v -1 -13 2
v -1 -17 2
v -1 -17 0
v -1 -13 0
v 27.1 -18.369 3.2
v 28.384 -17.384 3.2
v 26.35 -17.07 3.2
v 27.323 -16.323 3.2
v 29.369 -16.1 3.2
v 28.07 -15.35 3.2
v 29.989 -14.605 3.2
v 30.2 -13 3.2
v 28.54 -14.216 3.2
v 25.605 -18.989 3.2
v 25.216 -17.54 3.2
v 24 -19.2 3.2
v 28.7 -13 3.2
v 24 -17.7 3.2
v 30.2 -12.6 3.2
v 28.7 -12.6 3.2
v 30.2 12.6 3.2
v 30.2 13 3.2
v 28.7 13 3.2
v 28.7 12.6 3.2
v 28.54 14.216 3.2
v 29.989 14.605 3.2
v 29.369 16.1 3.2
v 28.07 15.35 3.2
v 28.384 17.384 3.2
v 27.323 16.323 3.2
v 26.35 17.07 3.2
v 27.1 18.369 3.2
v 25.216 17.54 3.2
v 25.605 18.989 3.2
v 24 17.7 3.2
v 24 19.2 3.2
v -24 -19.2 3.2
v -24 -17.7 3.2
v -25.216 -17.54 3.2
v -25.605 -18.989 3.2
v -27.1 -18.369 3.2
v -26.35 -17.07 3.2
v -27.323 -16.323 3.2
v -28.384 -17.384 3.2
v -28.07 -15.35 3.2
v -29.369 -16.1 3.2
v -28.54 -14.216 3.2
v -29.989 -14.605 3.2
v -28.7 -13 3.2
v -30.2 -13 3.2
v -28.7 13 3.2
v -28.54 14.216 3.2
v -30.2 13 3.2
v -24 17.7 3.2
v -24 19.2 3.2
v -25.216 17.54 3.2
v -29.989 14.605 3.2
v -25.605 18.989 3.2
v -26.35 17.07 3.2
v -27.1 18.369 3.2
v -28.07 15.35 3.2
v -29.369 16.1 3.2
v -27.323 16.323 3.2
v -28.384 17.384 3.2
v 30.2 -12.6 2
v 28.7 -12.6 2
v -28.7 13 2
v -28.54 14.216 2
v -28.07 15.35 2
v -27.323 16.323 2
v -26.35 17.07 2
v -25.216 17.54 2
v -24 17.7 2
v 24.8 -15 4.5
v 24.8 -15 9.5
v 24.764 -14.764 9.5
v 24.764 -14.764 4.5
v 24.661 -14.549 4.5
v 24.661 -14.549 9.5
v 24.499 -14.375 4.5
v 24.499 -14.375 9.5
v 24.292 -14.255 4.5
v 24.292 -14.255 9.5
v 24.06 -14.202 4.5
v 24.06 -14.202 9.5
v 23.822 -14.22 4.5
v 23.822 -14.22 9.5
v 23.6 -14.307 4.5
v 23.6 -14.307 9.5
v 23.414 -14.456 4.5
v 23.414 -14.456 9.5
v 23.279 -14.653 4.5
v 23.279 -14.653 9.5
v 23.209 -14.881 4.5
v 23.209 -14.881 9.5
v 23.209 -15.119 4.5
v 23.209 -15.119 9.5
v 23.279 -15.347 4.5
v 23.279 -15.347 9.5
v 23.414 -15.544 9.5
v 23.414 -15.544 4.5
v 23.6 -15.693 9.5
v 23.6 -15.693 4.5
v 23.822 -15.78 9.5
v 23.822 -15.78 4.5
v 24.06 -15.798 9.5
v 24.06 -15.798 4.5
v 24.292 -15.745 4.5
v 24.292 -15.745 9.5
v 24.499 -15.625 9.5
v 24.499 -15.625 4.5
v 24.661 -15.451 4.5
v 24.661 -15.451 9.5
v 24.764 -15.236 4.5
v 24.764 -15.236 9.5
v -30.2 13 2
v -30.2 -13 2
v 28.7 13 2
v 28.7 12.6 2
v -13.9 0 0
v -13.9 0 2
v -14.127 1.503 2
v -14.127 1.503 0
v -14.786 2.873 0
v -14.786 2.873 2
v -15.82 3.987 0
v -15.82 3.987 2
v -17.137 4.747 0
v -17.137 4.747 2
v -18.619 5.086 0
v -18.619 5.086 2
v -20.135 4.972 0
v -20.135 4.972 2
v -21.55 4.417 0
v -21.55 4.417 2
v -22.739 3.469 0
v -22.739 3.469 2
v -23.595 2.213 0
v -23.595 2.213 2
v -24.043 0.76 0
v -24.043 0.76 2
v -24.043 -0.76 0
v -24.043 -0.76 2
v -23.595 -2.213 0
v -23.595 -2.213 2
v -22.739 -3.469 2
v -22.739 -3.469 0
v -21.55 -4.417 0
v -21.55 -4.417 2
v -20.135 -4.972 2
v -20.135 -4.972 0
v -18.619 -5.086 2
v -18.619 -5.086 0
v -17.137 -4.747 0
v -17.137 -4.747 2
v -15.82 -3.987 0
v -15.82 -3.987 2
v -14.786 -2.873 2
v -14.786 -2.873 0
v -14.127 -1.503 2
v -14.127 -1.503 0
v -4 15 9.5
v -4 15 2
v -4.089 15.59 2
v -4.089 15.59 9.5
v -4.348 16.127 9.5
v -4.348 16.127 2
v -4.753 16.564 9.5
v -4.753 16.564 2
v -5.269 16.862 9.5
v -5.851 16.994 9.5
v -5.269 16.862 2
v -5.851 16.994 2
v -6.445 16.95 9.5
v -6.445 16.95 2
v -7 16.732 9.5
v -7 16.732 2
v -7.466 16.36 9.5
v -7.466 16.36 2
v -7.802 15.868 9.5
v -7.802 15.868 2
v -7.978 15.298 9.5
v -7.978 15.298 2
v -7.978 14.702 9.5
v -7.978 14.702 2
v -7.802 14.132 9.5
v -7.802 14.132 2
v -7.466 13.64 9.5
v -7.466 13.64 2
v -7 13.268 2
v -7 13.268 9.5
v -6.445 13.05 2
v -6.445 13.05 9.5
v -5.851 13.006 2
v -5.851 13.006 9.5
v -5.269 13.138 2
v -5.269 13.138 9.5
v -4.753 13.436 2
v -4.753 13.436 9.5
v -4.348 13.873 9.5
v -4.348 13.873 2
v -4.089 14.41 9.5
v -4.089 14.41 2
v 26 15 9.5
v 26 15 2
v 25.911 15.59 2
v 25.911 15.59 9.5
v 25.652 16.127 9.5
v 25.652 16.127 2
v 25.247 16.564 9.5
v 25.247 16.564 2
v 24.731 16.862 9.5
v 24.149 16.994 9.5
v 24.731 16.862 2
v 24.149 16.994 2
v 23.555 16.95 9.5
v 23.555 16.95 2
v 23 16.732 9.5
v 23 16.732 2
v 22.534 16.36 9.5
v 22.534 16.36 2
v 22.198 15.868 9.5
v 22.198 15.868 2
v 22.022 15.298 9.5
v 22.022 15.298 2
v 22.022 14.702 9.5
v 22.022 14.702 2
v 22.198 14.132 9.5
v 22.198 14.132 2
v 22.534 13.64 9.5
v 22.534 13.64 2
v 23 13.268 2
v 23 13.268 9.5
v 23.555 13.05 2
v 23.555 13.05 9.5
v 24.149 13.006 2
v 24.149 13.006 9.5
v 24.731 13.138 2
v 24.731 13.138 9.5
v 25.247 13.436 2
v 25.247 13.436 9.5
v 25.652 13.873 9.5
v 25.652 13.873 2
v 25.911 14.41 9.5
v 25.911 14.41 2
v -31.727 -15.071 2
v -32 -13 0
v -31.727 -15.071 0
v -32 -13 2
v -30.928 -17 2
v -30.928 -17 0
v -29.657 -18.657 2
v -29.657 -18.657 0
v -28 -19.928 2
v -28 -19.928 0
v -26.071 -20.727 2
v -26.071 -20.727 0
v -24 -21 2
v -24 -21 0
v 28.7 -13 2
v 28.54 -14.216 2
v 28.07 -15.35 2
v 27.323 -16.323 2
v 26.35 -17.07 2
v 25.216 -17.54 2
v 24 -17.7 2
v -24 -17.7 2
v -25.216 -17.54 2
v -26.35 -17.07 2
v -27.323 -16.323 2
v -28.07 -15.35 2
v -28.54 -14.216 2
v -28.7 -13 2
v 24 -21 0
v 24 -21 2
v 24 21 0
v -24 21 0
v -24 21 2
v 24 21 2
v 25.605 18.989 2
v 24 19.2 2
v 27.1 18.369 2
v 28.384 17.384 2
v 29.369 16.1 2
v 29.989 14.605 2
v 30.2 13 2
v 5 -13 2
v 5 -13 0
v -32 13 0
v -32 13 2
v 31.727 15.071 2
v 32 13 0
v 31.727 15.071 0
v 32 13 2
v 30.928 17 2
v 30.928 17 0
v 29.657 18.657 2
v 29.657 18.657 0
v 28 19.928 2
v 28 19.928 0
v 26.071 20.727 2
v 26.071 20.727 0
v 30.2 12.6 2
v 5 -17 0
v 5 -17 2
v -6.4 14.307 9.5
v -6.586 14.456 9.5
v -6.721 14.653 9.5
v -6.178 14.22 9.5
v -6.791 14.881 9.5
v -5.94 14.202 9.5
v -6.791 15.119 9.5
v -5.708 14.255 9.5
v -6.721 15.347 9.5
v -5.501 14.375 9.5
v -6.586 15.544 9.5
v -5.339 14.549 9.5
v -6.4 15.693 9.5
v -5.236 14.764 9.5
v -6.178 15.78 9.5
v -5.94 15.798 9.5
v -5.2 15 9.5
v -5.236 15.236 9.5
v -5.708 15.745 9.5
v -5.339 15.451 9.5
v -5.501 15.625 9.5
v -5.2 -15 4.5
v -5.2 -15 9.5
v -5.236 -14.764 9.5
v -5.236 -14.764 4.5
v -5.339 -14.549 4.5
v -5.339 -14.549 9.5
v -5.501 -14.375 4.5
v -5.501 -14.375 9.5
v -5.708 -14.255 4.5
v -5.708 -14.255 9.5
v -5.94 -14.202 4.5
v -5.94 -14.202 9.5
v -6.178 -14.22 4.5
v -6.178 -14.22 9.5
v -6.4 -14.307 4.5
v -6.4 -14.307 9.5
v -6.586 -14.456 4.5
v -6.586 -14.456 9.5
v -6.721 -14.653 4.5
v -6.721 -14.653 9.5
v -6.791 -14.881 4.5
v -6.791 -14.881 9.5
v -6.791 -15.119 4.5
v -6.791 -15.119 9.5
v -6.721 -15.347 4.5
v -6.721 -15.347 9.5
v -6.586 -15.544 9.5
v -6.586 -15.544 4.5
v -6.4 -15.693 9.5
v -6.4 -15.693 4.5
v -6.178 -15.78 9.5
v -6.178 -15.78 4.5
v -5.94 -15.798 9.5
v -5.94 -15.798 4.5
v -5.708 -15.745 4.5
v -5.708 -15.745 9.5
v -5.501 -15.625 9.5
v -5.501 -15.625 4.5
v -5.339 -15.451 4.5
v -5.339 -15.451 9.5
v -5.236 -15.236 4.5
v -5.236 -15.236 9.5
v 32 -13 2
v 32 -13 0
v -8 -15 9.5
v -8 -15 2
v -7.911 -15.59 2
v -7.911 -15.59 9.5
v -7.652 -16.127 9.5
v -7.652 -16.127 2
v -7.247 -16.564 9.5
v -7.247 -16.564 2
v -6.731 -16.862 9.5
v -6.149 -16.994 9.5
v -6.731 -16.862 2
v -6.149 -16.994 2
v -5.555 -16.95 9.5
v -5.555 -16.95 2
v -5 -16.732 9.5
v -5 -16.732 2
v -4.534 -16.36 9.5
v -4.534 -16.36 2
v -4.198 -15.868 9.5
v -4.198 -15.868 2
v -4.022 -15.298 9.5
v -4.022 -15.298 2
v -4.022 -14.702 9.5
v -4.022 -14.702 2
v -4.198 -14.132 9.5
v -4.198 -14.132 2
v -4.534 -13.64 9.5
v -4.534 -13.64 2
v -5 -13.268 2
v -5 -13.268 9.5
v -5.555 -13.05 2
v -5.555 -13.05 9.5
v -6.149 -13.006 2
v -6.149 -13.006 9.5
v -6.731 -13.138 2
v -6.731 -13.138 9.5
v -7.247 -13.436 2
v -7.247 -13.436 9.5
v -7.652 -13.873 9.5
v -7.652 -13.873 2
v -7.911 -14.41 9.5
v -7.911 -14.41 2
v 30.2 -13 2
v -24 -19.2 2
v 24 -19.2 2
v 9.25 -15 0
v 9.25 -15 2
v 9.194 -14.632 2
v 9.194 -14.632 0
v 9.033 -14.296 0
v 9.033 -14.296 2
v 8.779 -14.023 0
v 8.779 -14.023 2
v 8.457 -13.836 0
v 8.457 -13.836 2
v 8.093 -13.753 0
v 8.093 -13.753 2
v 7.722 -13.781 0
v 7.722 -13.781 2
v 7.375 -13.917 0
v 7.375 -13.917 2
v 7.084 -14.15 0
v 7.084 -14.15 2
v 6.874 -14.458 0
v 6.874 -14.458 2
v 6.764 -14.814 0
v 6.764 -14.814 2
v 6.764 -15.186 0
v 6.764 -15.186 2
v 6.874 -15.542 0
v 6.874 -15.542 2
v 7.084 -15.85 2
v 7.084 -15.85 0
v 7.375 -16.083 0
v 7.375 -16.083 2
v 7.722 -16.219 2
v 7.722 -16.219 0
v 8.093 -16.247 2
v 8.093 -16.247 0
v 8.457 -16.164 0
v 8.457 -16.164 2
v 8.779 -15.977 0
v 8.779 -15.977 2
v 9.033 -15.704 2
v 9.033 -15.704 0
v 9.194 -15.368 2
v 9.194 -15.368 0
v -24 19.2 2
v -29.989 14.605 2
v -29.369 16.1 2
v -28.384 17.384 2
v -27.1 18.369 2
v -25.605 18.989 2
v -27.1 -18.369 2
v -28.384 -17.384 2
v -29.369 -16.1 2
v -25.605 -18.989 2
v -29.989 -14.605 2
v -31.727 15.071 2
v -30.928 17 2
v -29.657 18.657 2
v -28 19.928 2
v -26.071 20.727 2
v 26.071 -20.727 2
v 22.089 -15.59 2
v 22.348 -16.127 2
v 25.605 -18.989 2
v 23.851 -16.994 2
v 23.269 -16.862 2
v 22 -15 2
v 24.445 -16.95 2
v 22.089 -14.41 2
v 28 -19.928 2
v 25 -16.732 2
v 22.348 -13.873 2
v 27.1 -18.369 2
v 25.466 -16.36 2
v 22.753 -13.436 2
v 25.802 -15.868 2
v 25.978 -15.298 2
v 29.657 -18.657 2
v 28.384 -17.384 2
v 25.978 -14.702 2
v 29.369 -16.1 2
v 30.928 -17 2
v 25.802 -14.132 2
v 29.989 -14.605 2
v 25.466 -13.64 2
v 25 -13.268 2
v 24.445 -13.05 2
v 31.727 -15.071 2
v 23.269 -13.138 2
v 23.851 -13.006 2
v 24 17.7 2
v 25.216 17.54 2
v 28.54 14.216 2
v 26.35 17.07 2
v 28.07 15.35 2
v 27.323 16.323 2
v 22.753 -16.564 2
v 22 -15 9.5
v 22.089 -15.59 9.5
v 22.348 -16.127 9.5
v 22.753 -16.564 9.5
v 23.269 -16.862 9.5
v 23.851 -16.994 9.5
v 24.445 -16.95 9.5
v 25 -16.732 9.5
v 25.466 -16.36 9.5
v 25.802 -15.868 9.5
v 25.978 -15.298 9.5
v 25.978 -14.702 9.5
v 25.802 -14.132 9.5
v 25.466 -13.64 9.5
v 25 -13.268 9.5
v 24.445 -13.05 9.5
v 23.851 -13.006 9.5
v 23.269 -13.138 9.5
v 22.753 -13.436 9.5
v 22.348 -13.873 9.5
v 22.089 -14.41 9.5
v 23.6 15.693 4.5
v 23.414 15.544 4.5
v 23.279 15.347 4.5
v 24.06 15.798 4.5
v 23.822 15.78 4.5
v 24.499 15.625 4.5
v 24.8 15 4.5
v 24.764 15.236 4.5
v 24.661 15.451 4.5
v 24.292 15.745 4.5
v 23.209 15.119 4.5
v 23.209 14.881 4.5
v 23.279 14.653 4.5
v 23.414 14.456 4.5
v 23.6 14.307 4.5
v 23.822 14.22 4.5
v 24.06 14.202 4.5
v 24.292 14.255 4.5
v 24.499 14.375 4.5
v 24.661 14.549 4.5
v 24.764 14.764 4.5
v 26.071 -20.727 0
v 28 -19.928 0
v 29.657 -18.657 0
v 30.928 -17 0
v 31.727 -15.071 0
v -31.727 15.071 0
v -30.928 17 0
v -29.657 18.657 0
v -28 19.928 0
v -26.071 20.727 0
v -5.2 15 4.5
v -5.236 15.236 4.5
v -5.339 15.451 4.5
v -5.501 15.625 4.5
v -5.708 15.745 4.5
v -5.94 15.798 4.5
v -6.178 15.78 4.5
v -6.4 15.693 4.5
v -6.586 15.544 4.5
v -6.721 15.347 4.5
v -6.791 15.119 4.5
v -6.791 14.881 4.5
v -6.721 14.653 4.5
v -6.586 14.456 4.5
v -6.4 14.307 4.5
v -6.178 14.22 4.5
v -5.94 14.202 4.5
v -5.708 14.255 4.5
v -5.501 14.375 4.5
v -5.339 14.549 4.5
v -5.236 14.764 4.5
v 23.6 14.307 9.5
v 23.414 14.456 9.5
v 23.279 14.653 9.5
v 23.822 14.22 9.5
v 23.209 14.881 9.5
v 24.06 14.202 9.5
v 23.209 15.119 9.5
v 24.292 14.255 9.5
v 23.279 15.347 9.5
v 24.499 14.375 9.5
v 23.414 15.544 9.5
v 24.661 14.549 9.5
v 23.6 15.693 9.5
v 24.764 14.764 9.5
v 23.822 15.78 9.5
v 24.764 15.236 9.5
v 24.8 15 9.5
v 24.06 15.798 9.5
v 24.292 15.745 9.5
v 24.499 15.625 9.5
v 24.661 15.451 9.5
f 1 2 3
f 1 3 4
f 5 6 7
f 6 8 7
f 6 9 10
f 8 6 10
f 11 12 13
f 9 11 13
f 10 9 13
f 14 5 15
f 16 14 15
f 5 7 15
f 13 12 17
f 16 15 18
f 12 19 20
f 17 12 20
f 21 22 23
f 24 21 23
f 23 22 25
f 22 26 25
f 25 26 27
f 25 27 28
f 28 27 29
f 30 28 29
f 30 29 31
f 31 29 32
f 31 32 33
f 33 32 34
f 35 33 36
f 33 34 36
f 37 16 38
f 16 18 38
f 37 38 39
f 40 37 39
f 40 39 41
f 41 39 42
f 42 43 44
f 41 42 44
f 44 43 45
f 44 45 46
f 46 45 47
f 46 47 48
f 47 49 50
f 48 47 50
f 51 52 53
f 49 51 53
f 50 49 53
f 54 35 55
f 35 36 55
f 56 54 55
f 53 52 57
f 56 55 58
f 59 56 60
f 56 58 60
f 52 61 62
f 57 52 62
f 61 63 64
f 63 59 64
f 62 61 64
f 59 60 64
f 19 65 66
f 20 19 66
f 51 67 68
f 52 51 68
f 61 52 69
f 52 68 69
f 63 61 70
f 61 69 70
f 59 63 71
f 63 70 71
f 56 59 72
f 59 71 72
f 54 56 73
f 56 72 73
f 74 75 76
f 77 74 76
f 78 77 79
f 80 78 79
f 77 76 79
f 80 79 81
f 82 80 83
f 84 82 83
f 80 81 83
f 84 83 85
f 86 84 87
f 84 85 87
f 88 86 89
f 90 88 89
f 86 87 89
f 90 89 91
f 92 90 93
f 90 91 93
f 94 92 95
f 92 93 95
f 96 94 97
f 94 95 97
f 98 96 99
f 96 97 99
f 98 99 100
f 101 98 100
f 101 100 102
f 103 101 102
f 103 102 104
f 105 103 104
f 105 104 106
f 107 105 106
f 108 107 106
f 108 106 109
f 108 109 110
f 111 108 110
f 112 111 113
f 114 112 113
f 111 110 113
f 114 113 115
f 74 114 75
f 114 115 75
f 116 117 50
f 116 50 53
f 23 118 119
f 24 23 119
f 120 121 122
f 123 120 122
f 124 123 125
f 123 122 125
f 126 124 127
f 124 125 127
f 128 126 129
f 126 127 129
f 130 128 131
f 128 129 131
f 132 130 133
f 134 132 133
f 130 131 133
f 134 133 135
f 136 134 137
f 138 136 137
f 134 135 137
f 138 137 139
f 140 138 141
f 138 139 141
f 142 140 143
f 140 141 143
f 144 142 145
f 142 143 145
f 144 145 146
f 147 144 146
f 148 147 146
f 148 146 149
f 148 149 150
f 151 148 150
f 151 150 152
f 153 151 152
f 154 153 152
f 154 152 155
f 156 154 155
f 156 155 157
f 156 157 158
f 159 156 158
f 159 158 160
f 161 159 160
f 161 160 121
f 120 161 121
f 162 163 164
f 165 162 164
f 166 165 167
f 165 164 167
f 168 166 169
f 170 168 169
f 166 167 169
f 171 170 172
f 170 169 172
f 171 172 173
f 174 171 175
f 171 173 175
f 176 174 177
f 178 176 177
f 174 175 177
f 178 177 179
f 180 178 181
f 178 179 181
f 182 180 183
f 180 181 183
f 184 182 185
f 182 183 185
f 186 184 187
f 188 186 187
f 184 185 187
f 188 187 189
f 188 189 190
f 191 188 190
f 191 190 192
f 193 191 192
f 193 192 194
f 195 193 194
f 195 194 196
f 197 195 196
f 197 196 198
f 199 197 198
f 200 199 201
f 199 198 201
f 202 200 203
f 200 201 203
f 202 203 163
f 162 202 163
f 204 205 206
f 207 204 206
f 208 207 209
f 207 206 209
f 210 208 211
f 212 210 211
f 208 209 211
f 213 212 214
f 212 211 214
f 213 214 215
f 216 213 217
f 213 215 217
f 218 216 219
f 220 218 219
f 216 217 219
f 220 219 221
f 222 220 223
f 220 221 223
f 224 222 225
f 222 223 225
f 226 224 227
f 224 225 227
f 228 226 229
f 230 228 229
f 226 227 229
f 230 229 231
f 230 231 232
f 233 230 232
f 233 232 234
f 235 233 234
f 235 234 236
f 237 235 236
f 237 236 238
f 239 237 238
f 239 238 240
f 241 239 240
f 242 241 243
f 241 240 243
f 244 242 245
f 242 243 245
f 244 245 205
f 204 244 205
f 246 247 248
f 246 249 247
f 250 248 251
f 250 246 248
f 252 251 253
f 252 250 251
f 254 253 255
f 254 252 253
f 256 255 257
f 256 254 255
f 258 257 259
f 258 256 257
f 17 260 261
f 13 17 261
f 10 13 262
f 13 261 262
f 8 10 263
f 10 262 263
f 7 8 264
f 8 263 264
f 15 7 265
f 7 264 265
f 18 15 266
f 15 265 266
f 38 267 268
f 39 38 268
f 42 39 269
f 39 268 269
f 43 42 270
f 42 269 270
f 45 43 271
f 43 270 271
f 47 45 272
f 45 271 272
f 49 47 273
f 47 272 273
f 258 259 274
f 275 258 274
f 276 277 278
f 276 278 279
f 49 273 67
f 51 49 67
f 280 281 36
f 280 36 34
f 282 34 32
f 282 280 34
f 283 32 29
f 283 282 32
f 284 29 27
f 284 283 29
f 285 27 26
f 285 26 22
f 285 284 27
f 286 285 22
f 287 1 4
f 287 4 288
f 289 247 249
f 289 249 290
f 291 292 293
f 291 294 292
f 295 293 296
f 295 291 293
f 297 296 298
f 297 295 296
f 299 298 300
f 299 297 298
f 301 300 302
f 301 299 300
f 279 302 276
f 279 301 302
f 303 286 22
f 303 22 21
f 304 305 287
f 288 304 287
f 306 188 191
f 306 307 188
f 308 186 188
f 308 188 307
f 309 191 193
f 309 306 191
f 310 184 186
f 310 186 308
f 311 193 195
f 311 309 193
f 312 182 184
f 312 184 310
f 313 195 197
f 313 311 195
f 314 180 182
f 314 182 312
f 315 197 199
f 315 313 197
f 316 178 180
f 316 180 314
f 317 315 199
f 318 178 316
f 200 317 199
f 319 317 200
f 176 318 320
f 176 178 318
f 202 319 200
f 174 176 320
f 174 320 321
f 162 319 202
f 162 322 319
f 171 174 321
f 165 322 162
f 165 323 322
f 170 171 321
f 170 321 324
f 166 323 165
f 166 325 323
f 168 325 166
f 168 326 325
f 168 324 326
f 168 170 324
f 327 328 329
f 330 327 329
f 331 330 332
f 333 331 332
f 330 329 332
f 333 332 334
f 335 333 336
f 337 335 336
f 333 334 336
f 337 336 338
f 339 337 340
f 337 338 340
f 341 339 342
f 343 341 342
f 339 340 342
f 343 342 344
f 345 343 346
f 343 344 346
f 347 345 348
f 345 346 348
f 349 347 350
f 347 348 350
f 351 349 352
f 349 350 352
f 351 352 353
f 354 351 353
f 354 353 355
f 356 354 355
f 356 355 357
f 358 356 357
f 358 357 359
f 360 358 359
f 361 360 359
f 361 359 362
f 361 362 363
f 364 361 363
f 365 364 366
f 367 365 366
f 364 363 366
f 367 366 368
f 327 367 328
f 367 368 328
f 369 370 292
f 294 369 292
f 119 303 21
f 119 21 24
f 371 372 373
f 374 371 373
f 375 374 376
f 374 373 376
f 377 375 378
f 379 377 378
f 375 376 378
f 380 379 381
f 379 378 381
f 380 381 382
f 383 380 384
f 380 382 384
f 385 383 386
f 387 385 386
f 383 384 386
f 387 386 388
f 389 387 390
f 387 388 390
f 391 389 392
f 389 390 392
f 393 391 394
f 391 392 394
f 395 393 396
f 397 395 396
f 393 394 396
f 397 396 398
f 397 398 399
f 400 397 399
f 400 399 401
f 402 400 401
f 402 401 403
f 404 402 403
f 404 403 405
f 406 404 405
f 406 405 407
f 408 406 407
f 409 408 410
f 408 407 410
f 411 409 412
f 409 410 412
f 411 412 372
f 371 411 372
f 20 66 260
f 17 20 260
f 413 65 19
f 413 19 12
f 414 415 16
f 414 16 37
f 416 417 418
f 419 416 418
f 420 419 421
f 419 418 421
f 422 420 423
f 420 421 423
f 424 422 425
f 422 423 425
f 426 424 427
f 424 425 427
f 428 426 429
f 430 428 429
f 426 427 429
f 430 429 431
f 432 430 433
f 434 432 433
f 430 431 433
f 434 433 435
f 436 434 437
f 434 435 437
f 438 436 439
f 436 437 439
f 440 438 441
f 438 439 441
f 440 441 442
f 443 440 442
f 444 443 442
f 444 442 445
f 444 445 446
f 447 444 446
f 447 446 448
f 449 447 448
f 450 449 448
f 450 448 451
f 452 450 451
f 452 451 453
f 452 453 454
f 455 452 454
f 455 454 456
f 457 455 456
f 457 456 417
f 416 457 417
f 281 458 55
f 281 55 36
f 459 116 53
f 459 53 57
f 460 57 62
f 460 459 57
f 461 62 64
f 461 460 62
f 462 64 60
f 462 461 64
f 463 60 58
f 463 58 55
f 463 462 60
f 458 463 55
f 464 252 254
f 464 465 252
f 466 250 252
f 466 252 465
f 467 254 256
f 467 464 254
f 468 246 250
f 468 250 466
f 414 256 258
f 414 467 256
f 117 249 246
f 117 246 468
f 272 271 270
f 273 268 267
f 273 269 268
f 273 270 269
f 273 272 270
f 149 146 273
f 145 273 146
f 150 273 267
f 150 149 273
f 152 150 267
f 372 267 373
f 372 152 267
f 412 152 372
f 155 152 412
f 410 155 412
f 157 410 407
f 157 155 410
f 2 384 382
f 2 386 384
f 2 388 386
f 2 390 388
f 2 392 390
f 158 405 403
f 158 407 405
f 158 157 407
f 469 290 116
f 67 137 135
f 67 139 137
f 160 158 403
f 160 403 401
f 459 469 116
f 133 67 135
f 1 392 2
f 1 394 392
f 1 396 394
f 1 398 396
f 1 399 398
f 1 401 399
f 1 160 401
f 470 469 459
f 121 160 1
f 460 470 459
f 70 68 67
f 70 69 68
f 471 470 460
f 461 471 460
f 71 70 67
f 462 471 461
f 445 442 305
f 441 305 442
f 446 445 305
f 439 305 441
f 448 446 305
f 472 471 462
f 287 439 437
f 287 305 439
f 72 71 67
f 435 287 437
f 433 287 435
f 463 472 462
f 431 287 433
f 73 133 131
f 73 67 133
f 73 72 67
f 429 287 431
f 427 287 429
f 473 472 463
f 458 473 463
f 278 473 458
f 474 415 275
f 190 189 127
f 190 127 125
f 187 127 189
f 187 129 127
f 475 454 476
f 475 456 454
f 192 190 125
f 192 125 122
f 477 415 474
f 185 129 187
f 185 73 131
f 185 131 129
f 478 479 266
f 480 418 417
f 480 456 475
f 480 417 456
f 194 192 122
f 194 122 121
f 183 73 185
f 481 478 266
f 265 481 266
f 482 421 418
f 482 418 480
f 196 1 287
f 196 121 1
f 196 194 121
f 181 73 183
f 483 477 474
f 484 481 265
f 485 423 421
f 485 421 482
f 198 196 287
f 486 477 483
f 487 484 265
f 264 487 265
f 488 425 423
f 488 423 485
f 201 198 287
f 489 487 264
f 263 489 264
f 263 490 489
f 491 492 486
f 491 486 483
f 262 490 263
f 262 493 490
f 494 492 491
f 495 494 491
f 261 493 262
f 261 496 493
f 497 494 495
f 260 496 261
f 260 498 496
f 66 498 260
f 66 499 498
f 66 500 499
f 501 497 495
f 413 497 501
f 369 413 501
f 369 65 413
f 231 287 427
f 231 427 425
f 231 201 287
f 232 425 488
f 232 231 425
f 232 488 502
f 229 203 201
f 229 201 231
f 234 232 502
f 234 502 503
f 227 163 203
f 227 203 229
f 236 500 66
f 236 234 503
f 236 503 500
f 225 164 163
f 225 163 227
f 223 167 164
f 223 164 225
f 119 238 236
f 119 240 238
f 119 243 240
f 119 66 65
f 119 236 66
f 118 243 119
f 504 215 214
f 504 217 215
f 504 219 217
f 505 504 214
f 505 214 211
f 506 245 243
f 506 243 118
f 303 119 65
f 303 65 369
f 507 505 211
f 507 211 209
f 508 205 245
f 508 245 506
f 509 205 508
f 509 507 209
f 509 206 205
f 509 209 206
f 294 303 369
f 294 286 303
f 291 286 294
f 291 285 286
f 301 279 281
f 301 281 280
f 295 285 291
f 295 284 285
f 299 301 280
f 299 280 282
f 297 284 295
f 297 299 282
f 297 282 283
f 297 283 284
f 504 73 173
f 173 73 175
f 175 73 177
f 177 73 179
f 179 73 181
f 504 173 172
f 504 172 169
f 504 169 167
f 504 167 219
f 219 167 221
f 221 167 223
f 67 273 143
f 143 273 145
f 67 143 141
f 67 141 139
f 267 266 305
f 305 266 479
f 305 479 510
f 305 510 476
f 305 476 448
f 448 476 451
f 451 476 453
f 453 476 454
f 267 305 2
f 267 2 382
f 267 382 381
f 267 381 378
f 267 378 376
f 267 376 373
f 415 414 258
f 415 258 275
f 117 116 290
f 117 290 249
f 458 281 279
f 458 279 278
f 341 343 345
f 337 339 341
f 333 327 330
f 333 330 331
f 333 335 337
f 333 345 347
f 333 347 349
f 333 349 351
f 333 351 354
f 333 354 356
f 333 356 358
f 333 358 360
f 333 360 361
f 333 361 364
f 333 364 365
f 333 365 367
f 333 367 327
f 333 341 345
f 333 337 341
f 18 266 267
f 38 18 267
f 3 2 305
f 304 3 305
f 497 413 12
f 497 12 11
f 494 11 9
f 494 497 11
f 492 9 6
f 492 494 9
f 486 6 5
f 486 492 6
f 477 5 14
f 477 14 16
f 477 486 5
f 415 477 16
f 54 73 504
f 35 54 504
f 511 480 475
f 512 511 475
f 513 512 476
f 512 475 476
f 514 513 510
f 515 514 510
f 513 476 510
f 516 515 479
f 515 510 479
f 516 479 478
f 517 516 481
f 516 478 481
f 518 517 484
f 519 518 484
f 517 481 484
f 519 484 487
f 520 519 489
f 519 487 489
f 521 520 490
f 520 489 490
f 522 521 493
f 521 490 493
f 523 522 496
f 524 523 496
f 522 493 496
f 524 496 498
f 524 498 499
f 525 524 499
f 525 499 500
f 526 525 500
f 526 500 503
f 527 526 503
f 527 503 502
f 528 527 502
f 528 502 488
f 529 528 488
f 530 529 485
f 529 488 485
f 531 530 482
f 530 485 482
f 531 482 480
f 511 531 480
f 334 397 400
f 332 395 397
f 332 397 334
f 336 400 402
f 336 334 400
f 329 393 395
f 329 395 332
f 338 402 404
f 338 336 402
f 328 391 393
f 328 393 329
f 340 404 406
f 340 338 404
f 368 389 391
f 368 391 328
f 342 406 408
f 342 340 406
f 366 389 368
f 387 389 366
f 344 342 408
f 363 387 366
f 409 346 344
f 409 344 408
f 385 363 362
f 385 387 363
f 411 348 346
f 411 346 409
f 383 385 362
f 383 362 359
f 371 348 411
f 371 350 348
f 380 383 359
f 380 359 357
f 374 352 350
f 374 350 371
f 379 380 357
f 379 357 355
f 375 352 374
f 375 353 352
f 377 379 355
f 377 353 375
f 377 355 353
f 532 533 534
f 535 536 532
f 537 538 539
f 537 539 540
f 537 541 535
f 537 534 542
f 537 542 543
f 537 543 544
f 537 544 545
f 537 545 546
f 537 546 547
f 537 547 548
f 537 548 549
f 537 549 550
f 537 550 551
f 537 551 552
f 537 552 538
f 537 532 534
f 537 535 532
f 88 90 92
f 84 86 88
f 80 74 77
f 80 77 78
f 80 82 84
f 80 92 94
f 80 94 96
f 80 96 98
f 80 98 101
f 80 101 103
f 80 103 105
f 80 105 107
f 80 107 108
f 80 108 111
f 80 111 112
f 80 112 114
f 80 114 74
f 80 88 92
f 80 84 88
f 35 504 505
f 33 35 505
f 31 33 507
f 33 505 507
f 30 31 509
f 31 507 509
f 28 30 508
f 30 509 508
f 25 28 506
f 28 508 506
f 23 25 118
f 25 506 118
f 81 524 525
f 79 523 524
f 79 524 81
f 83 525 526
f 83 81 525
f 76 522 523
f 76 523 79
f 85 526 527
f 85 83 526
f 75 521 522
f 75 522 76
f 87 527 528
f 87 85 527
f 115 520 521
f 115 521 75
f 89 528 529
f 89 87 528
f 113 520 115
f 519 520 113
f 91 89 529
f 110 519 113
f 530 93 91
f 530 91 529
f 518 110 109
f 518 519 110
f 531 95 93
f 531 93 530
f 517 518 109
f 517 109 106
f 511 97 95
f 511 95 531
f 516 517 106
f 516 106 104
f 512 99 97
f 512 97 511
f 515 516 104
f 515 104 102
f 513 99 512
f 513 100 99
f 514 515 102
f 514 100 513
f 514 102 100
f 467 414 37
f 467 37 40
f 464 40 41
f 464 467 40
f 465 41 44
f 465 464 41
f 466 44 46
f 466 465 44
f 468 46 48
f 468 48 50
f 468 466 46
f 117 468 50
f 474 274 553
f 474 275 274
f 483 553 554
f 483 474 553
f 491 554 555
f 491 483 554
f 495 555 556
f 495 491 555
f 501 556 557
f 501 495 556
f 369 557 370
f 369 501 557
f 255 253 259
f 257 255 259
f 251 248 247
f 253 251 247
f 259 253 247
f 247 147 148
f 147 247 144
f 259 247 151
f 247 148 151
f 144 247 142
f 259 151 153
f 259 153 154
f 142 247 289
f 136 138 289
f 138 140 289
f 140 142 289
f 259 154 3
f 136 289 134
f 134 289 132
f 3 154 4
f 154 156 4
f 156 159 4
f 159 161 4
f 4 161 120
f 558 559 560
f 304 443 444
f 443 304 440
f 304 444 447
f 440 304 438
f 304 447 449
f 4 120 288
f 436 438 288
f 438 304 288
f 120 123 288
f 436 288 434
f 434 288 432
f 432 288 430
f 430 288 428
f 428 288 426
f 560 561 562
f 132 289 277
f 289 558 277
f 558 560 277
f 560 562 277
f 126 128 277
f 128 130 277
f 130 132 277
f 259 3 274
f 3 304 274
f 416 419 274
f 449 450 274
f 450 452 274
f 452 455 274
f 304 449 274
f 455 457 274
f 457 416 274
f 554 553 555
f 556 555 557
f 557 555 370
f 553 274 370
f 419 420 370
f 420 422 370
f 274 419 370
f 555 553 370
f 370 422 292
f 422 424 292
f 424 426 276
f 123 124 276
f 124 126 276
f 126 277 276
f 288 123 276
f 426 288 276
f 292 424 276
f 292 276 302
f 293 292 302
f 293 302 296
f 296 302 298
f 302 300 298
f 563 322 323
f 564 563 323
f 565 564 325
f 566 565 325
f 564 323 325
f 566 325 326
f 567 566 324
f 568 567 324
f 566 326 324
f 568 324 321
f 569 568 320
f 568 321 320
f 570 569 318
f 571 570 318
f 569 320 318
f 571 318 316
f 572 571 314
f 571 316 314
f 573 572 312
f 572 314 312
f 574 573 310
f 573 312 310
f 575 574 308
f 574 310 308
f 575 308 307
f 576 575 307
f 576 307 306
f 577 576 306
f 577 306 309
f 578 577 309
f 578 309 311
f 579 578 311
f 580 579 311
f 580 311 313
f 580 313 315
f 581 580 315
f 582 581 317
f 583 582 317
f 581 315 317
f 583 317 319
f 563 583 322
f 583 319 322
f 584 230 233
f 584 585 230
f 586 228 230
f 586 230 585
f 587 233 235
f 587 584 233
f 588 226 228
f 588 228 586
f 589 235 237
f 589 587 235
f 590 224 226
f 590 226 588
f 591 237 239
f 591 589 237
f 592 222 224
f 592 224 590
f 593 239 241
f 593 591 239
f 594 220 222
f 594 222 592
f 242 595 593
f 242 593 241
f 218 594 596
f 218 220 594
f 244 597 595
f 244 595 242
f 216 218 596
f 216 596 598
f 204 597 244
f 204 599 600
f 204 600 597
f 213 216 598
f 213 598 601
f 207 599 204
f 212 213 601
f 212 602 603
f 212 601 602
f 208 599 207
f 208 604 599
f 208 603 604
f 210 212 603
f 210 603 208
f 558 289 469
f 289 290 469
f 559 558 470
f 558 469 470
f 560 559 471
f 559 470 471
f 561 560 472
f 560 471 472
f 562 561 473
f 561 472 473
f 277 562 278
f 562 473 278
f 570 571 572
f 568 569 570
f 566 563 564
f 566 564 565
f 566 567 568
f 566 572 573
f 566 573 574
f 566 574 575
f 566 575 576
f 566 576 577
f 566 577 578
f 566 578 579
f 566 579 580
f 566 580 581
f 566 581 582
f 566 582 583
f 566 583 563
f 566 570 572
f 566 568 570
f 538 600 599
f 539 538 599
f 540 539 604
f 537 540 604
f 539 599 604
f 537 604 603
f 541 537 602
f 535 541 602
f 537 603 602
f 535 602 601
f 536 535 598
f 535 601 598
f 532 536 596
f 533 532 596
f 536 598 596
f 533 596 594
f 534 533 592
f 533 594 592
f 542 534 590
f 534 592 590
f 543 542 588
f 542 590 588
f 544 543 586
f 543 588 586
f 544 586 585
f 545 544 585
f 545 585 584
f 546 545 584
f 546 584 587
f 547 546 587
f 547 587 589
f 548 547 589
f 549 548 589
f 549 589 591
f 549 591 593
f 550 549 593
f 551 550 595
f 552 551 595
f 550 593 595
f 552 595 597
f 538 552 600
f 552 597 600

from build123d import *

# Parameters (mm, degrees)
SKETCH1_W           = 64
SKETCH1_H           = 42
BOSS_EXTRUDE1_DEPTH = 2
FILLET1_R           = 8
BOSS_EXTRUDE2_DEPTH = 1.2
SKETCH3_W           = 6
SKETCH3_H           = 25.2
CUT_EXTRUDE1_DEPTH  = 1.2
SKETCH4_R           = 2
BOSS_EXTRUDE3_DEPTH = 7.5
SKETCH5_R           = 0.8
CUT_EXTRUDE2_DEPTH  = 5
SKETCH6_R           = 5.1
SKETCH6_R_2         = 1.25
SKETCH6_W           = 6
SKETCH6_H           = 4
CUT_EXTRUDE3_DEPTH  = 40.003204997


with BuildPart() as part:
    # Sketch1 → Boss-Extrude1 (new body)
    with BuildSketch(Plane.XY):
        Rectangle(SKETCH1_W, SKETCH1_H)
    extrude(amount=BOSS_EXTRUDE1_DEPTH)

    # Fillet1
    fillet1_edges = [part.edges().sort_by_distance(p)[0] for p in [
        (-32, 21, 1),
        (32, 21, 1),
        (32, -21, 1),
        (-32, -21, 1),
    ]]
    fillet(fillet1_edges, radius=FILLET1_R)

    # Sketch2 → Boss-Extrude2 (add)
    with BuildSketch(Plane.XY.offset(2)):
        with BuildLine():
            Line((-24, 19.2), (24, 19.2))
            ThreePointArc((24, 19.2), (28.384062043, 17.384062043), (30.2, 13))
            Line((30.2, 13), (30.2, -13))
            ThreePointArc((30.2, -13), (28.384062043, -17.384062043), (24, -19.2))
            Line((24, -19.2), (-24, -19.2))
            ThreePointArc((-24, -19.2), (-28.384062043, -17.384062043), (-30.2, -13))
            Line((-30.2, -13), (-30.2, 13))
            ThreePointArc((-30.2, 13), (-28.384062043, 17.384062043), (-24, 19.2))
        make_face()
        with BuildLine():
            Line((-24, 17.7), (24, 17.7))
            ThreePointArc((24, 17.7), (27.323401872, 16.323401872), (28.7, 13))
            Line((28.7, 13), (28.7, -13))
            ThreePointArc((28.7, -13), (27.323401872, -16.323401872), (24, -17.7))
            Line((24, -17.7), (-24, -17.7))
            ThreePointArc((-24, -17.7), (-27.323401872, -16.323401872), (-28.7, -13))
            Line((-28.7, -13), (-28.7, 13))
            ThreePointArc((-28.7, 13), (-27.323401872, 16.323401872), (-24, 17.7))
        make_face(mode=Mode.SUBTRACT)
    extrude(amount=BOSS_EXTRUDE2_DEPTH)

    # Sketch3 → Cut-Extrude1 (cut)
    with BuildSketch(Plane(origin=(0, 0, 2), x_dir=(-1, 0, 0), z_dir=(0, 0, -1))):
        with Locations((-30, 0)):
            Rectangle(SKETCH3_W, SKETCH3_H)
    extrude(amount=-CUT_EXTRUDE1_DEPTH, mode=Mode.SUBTRACT)

    # Sketch4 → Boss-Extrude3 (add)
    with BuildSketch(Plane.XY.offset(2)):
        with Locations((-6, 15)):
            Circle(SKETCH4_R)
        with Locations((24, 15)):
            Circle(SKETCH4_R)
        with Locations(Location((24, -15, 0), (0, 0, 180))):
            Circle(SKETCH4_R)
        with Locations(Location((-6, -15, 0), (0, 0, 180))):
            Circle(SKETCH4_R)
    extrude(amount=BOSS_EXTRUDE3_DEPTH)

    # Sketch5 → Cut-Extrude2 (cut)
    with BuildSketch(Plane.XY.offset(9.5)):
        with Locations((24, 15)):
            Circle(SKETCH5_R)
    cut_extrude2 = extrude(amount=-CUT_EXTRUDE2_DEPTH, mode=Mode.SUBTRACT)

    # Sketch-Pattern1: Cut-Extrude2 at 3 more places
    with Locations((-30, 0, 0), (-30, -30, 0), (0, -30, 0)):
        add(cut_extrude2, mode=Mode.SUBTRACT)

    # Sketch6 → Cut-Extrude3 (cut, through all)
    with BuildSketch(Plane.XY.offset(2)):
        with Locations((-19, 0)):
            Circle(SKETCH6_R)
        with Locations((8, -15)):
            Circle(SKETCH6_R_2)
        with Locations((2, -15)):
            Rectangle(SKETCH6_W, SKETCH6_H)
    extrude(amount=-CUT_EXTRUDE3_DEPTH, mode=Mode.SUBTRACT)


solid = part.part
